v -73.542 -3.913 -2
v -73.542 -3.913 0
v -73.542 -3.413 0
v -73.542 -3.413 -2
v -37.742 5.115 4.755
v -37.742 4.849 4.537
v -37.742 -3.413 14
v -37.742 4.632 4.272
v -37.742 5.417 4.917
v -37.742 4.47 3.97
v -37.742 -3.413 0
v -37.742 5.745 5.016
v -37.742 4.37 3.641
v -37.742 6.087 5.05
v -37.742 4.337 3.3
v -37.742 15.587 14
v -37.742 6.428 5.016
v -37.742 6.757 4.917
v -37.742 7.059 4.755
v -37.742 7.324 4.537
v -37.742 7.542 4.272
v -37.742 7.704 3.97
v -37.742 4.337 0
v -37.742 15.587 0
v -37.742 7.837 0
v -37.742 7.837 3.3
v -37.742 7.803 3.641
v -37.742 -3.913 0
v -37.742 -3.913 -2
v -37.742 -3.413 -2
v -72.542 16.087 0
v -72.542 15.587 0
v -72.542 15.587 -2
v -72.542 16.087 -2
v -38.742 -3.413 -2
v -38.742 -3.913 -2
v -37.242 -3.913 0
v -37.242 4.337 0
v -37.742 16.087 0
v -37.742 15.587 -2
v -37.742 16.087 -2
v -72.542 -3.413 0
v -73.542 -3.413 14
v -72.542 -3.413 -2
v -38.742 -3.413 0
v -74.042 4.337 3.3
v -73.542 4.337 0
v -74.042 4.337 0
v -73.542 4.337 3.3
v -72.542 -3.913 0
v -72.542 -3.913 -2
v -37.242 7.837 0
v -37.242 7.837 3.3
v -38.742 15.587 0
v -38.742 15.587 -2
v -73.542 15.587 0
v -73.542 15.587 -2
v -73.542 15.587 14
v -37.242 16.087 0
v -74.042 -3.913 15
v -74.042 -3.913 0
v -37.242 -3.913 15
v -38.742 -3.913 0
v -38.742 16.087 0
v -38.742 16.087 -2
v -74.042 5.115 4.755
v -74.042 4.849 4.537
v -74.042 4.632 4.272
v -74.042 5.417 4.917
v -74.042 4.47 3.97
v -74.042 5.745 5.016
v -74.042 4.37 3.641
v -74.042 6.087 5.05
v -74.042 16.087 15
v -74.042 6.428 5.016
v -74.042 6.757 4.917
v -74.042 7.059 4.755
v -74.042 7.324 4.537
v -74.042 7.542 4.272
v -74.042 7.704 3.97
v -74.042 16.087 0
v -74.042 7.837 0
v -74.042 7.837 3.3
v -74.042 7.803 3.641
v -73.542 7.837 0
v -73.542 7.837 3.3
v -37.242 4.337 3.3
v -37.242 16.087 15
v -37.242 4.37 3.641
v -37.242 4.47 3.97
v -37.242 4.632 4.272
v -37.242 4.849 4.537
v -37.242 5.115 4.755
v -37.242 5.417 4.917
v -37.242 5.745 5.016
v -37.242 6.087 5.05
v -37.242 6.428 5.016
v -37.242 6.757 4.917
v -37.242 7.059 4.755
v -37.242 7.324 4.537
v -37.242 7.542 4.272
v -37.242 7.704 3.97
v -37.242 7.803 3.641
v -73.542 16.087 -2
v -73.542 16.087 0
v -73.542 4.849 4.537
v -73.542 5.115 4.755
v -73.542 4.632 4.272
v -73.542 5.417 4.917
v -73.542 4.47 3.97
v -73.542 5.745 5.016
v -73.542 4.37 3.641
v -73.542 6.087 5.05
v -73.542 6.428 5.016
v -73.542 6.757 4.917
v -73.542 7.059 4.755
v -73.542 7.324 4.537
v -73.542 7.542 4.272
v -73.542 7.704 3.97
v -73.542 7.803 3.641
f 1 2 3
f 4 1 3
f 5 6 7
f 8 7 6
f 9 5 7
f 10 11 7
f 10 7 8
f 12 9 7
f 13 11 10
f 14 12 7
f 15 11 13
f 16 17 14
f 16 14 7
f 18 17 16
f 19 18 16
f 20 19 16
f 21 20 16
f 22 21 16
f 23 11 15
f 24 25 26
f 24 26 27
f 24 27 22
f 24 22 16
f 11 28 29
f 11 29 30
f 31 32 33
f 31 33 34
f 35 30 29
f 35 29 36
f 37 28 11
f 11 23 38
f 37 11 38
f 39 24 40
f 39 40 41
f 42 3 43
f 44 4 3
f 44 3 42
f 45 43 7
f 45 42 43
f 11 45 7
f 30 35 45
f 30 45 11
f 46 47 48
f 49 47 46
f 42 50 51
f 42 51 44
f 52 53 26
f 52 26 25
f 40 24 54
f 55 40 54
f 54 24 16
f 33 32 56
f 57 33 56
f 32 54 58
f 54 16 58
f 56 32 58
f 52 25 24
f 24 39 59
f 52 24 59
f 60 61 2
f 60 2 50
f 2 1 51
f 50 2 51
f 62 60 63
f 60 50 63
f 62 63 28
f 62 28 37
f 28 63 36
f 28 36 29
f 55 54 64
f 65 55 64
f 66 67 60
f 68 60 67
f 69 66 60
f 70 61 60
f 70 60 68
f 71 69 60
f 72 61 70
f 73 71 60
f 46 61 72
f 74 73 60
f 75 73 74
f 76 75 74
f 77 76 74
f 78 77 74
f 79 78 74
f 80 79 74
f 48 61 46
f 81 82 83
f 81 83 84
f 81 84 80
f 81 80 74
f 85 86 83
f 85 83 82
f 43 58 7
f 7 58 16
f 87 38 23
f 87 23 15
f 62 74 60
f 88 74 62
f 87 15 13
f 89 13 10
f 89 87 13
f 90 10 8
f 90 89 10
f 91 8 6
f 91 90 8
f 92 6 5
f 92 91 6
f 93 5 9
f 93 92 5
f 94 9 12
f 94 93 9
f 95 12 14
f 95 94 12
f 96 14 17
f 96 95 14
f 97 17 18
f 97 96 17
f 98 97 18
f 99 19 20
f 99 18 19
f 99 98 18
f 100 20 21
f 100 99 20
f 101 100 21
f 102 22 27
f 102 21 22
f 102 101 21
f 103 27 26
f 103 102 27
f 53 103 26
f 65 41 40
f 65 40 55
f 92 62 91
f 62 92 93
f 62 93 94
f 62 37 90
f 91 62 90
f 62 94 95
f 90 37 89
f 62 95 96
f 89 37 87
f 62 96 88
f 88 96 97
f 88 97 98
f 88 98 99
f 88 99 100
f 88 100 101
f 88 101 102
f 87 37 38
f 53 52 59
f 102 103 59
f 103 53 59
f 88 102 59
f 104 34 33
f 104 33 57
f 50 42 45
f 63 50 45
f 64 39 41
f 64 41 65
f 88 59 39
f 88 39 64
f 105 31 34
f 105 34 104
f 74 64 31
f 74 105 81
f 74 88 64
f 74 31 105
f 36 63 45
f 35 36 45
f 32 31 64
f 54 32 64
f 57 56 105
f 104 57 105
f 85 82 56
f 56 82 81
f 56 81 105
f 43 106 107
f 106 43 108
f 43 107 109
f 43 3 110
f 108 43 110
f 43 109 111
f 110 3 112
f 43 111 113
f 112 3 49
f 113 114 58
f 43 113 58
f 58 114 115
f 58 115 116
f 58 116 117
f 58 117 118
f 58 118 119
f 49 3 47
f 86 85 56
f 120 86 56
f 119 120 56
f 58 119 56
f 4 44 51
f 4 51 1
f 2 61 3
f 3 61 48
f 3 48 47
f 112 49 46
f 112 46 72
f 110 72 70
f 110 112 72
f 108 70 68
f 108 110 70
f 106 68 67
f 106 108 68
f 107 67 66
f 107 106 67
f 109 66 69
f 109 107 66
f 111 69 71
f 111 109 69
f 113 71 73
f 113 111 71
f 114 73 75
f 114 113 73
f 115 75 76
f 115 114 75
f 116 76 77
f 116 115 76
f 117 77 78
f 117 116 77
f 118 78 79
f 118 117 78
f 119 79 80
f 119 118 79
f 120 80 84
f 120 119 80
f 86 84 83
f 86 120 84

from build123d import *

# Parameters (mm, degrees)
ESQUISSE1_W             = 36.8
ESQUISSE1_H             = 20
ESQUISSE1_W_2           = 35.8
ESQUISSE1_H_2           = 19
BASE_EXTRUSION_DEPTH    = 14
ESQUISSE2_W             = 36.8
ESQUISSE2_H             = 20
BOSS_EXTRU_1_DEPTH      = 1
ENL_V_MAT_EXTRU_1_DEPTH = 43.872204303
ESQUISSE4_W             = 1
ESQUISSE4_H             = 0.5
BOSS_EXTRU_2_DEPTH      = 2


with BuildPart() as part:
    # Esquisse1 → Base-Extrusion (new body)
    with BuildSketch(Plane.XY):
        with Locations((-55.64228109, 6.086823856)):
            Rectangle(ESQUISSE1_W, ESQUISSE1_H)
        with Locations((-55.64228109, 6.086823856)):
            Rectangle(ESQUISSE1_W_2, ESQUISSE1_H_2, mode=Mode.SUBTRACT)
    extrude(amount=BASE_EXTRUSION_DEPTH)

    # Esquisse2 → Boss.-Extru.1 (add)
    with BuildSketch(Plane.XY.offset(14)):
        with Locations((-55.64228109, 6.086823856)):
            Rectangle(ESQUISSE2_W, ESQUISSE2_H)
    extrude(amount=BOSS_EXTRU_1_DEPTH)

    # Esquisse3 → Enlèv. mat.-Extru.1 (cut, through all)
    with BuildSketch(Plane(origin=(-37.24228109, 0, 0), x_dir=(0, 0, -1), z_dir=(1, 0, 0))):
        with BuildLine():
            Line((0.67598994, 7.836823856), (0.67598994, 4.336823856))
            Line((0.67598994, 4.336823856), (-3.3, 4.336823856))
            ThreePointArc((-3.3, 4.336823856), (-5.05, 6.086823856), (-3.3, 7.836823856))
            Line((-3.3, 7.836823856), (0.67598994, 7.836823856))
        make_face()
    extrude(amount=-ENL_V_MAT_EXTRU_1_DEPTH, mode=Mode.SUBTRACT)

    # Esquisse4 → Boss.-Extru.2 (add)
    with BuildSketch(Plane(origin=(0, 0, 0), x_dir=(-1, 0, 0), z_dir=(0, 0, -1))):
        with Locations((38.24228109, 15.836823856)):
            Rectangle(ESQUISSE4_W, ESQUISSE4_H)
        with Locations((73.04228109, 15.836823856)):
            Rectangle(ESQUISSE4_W, ESQUISSE4_H)
        with Locations((73.04228109, -3.663176144)):
            Rectangle(ESQUISSE4_W, ESQUISSE4_H)
        with Locations((38.24228109, -3.663176144)):
            Rectangle(ESQUISSE4_W, ESQUISSE4_H)
    extrude(amount=BOSS_EXTRU_2_DEPTH)


solid = part.part
